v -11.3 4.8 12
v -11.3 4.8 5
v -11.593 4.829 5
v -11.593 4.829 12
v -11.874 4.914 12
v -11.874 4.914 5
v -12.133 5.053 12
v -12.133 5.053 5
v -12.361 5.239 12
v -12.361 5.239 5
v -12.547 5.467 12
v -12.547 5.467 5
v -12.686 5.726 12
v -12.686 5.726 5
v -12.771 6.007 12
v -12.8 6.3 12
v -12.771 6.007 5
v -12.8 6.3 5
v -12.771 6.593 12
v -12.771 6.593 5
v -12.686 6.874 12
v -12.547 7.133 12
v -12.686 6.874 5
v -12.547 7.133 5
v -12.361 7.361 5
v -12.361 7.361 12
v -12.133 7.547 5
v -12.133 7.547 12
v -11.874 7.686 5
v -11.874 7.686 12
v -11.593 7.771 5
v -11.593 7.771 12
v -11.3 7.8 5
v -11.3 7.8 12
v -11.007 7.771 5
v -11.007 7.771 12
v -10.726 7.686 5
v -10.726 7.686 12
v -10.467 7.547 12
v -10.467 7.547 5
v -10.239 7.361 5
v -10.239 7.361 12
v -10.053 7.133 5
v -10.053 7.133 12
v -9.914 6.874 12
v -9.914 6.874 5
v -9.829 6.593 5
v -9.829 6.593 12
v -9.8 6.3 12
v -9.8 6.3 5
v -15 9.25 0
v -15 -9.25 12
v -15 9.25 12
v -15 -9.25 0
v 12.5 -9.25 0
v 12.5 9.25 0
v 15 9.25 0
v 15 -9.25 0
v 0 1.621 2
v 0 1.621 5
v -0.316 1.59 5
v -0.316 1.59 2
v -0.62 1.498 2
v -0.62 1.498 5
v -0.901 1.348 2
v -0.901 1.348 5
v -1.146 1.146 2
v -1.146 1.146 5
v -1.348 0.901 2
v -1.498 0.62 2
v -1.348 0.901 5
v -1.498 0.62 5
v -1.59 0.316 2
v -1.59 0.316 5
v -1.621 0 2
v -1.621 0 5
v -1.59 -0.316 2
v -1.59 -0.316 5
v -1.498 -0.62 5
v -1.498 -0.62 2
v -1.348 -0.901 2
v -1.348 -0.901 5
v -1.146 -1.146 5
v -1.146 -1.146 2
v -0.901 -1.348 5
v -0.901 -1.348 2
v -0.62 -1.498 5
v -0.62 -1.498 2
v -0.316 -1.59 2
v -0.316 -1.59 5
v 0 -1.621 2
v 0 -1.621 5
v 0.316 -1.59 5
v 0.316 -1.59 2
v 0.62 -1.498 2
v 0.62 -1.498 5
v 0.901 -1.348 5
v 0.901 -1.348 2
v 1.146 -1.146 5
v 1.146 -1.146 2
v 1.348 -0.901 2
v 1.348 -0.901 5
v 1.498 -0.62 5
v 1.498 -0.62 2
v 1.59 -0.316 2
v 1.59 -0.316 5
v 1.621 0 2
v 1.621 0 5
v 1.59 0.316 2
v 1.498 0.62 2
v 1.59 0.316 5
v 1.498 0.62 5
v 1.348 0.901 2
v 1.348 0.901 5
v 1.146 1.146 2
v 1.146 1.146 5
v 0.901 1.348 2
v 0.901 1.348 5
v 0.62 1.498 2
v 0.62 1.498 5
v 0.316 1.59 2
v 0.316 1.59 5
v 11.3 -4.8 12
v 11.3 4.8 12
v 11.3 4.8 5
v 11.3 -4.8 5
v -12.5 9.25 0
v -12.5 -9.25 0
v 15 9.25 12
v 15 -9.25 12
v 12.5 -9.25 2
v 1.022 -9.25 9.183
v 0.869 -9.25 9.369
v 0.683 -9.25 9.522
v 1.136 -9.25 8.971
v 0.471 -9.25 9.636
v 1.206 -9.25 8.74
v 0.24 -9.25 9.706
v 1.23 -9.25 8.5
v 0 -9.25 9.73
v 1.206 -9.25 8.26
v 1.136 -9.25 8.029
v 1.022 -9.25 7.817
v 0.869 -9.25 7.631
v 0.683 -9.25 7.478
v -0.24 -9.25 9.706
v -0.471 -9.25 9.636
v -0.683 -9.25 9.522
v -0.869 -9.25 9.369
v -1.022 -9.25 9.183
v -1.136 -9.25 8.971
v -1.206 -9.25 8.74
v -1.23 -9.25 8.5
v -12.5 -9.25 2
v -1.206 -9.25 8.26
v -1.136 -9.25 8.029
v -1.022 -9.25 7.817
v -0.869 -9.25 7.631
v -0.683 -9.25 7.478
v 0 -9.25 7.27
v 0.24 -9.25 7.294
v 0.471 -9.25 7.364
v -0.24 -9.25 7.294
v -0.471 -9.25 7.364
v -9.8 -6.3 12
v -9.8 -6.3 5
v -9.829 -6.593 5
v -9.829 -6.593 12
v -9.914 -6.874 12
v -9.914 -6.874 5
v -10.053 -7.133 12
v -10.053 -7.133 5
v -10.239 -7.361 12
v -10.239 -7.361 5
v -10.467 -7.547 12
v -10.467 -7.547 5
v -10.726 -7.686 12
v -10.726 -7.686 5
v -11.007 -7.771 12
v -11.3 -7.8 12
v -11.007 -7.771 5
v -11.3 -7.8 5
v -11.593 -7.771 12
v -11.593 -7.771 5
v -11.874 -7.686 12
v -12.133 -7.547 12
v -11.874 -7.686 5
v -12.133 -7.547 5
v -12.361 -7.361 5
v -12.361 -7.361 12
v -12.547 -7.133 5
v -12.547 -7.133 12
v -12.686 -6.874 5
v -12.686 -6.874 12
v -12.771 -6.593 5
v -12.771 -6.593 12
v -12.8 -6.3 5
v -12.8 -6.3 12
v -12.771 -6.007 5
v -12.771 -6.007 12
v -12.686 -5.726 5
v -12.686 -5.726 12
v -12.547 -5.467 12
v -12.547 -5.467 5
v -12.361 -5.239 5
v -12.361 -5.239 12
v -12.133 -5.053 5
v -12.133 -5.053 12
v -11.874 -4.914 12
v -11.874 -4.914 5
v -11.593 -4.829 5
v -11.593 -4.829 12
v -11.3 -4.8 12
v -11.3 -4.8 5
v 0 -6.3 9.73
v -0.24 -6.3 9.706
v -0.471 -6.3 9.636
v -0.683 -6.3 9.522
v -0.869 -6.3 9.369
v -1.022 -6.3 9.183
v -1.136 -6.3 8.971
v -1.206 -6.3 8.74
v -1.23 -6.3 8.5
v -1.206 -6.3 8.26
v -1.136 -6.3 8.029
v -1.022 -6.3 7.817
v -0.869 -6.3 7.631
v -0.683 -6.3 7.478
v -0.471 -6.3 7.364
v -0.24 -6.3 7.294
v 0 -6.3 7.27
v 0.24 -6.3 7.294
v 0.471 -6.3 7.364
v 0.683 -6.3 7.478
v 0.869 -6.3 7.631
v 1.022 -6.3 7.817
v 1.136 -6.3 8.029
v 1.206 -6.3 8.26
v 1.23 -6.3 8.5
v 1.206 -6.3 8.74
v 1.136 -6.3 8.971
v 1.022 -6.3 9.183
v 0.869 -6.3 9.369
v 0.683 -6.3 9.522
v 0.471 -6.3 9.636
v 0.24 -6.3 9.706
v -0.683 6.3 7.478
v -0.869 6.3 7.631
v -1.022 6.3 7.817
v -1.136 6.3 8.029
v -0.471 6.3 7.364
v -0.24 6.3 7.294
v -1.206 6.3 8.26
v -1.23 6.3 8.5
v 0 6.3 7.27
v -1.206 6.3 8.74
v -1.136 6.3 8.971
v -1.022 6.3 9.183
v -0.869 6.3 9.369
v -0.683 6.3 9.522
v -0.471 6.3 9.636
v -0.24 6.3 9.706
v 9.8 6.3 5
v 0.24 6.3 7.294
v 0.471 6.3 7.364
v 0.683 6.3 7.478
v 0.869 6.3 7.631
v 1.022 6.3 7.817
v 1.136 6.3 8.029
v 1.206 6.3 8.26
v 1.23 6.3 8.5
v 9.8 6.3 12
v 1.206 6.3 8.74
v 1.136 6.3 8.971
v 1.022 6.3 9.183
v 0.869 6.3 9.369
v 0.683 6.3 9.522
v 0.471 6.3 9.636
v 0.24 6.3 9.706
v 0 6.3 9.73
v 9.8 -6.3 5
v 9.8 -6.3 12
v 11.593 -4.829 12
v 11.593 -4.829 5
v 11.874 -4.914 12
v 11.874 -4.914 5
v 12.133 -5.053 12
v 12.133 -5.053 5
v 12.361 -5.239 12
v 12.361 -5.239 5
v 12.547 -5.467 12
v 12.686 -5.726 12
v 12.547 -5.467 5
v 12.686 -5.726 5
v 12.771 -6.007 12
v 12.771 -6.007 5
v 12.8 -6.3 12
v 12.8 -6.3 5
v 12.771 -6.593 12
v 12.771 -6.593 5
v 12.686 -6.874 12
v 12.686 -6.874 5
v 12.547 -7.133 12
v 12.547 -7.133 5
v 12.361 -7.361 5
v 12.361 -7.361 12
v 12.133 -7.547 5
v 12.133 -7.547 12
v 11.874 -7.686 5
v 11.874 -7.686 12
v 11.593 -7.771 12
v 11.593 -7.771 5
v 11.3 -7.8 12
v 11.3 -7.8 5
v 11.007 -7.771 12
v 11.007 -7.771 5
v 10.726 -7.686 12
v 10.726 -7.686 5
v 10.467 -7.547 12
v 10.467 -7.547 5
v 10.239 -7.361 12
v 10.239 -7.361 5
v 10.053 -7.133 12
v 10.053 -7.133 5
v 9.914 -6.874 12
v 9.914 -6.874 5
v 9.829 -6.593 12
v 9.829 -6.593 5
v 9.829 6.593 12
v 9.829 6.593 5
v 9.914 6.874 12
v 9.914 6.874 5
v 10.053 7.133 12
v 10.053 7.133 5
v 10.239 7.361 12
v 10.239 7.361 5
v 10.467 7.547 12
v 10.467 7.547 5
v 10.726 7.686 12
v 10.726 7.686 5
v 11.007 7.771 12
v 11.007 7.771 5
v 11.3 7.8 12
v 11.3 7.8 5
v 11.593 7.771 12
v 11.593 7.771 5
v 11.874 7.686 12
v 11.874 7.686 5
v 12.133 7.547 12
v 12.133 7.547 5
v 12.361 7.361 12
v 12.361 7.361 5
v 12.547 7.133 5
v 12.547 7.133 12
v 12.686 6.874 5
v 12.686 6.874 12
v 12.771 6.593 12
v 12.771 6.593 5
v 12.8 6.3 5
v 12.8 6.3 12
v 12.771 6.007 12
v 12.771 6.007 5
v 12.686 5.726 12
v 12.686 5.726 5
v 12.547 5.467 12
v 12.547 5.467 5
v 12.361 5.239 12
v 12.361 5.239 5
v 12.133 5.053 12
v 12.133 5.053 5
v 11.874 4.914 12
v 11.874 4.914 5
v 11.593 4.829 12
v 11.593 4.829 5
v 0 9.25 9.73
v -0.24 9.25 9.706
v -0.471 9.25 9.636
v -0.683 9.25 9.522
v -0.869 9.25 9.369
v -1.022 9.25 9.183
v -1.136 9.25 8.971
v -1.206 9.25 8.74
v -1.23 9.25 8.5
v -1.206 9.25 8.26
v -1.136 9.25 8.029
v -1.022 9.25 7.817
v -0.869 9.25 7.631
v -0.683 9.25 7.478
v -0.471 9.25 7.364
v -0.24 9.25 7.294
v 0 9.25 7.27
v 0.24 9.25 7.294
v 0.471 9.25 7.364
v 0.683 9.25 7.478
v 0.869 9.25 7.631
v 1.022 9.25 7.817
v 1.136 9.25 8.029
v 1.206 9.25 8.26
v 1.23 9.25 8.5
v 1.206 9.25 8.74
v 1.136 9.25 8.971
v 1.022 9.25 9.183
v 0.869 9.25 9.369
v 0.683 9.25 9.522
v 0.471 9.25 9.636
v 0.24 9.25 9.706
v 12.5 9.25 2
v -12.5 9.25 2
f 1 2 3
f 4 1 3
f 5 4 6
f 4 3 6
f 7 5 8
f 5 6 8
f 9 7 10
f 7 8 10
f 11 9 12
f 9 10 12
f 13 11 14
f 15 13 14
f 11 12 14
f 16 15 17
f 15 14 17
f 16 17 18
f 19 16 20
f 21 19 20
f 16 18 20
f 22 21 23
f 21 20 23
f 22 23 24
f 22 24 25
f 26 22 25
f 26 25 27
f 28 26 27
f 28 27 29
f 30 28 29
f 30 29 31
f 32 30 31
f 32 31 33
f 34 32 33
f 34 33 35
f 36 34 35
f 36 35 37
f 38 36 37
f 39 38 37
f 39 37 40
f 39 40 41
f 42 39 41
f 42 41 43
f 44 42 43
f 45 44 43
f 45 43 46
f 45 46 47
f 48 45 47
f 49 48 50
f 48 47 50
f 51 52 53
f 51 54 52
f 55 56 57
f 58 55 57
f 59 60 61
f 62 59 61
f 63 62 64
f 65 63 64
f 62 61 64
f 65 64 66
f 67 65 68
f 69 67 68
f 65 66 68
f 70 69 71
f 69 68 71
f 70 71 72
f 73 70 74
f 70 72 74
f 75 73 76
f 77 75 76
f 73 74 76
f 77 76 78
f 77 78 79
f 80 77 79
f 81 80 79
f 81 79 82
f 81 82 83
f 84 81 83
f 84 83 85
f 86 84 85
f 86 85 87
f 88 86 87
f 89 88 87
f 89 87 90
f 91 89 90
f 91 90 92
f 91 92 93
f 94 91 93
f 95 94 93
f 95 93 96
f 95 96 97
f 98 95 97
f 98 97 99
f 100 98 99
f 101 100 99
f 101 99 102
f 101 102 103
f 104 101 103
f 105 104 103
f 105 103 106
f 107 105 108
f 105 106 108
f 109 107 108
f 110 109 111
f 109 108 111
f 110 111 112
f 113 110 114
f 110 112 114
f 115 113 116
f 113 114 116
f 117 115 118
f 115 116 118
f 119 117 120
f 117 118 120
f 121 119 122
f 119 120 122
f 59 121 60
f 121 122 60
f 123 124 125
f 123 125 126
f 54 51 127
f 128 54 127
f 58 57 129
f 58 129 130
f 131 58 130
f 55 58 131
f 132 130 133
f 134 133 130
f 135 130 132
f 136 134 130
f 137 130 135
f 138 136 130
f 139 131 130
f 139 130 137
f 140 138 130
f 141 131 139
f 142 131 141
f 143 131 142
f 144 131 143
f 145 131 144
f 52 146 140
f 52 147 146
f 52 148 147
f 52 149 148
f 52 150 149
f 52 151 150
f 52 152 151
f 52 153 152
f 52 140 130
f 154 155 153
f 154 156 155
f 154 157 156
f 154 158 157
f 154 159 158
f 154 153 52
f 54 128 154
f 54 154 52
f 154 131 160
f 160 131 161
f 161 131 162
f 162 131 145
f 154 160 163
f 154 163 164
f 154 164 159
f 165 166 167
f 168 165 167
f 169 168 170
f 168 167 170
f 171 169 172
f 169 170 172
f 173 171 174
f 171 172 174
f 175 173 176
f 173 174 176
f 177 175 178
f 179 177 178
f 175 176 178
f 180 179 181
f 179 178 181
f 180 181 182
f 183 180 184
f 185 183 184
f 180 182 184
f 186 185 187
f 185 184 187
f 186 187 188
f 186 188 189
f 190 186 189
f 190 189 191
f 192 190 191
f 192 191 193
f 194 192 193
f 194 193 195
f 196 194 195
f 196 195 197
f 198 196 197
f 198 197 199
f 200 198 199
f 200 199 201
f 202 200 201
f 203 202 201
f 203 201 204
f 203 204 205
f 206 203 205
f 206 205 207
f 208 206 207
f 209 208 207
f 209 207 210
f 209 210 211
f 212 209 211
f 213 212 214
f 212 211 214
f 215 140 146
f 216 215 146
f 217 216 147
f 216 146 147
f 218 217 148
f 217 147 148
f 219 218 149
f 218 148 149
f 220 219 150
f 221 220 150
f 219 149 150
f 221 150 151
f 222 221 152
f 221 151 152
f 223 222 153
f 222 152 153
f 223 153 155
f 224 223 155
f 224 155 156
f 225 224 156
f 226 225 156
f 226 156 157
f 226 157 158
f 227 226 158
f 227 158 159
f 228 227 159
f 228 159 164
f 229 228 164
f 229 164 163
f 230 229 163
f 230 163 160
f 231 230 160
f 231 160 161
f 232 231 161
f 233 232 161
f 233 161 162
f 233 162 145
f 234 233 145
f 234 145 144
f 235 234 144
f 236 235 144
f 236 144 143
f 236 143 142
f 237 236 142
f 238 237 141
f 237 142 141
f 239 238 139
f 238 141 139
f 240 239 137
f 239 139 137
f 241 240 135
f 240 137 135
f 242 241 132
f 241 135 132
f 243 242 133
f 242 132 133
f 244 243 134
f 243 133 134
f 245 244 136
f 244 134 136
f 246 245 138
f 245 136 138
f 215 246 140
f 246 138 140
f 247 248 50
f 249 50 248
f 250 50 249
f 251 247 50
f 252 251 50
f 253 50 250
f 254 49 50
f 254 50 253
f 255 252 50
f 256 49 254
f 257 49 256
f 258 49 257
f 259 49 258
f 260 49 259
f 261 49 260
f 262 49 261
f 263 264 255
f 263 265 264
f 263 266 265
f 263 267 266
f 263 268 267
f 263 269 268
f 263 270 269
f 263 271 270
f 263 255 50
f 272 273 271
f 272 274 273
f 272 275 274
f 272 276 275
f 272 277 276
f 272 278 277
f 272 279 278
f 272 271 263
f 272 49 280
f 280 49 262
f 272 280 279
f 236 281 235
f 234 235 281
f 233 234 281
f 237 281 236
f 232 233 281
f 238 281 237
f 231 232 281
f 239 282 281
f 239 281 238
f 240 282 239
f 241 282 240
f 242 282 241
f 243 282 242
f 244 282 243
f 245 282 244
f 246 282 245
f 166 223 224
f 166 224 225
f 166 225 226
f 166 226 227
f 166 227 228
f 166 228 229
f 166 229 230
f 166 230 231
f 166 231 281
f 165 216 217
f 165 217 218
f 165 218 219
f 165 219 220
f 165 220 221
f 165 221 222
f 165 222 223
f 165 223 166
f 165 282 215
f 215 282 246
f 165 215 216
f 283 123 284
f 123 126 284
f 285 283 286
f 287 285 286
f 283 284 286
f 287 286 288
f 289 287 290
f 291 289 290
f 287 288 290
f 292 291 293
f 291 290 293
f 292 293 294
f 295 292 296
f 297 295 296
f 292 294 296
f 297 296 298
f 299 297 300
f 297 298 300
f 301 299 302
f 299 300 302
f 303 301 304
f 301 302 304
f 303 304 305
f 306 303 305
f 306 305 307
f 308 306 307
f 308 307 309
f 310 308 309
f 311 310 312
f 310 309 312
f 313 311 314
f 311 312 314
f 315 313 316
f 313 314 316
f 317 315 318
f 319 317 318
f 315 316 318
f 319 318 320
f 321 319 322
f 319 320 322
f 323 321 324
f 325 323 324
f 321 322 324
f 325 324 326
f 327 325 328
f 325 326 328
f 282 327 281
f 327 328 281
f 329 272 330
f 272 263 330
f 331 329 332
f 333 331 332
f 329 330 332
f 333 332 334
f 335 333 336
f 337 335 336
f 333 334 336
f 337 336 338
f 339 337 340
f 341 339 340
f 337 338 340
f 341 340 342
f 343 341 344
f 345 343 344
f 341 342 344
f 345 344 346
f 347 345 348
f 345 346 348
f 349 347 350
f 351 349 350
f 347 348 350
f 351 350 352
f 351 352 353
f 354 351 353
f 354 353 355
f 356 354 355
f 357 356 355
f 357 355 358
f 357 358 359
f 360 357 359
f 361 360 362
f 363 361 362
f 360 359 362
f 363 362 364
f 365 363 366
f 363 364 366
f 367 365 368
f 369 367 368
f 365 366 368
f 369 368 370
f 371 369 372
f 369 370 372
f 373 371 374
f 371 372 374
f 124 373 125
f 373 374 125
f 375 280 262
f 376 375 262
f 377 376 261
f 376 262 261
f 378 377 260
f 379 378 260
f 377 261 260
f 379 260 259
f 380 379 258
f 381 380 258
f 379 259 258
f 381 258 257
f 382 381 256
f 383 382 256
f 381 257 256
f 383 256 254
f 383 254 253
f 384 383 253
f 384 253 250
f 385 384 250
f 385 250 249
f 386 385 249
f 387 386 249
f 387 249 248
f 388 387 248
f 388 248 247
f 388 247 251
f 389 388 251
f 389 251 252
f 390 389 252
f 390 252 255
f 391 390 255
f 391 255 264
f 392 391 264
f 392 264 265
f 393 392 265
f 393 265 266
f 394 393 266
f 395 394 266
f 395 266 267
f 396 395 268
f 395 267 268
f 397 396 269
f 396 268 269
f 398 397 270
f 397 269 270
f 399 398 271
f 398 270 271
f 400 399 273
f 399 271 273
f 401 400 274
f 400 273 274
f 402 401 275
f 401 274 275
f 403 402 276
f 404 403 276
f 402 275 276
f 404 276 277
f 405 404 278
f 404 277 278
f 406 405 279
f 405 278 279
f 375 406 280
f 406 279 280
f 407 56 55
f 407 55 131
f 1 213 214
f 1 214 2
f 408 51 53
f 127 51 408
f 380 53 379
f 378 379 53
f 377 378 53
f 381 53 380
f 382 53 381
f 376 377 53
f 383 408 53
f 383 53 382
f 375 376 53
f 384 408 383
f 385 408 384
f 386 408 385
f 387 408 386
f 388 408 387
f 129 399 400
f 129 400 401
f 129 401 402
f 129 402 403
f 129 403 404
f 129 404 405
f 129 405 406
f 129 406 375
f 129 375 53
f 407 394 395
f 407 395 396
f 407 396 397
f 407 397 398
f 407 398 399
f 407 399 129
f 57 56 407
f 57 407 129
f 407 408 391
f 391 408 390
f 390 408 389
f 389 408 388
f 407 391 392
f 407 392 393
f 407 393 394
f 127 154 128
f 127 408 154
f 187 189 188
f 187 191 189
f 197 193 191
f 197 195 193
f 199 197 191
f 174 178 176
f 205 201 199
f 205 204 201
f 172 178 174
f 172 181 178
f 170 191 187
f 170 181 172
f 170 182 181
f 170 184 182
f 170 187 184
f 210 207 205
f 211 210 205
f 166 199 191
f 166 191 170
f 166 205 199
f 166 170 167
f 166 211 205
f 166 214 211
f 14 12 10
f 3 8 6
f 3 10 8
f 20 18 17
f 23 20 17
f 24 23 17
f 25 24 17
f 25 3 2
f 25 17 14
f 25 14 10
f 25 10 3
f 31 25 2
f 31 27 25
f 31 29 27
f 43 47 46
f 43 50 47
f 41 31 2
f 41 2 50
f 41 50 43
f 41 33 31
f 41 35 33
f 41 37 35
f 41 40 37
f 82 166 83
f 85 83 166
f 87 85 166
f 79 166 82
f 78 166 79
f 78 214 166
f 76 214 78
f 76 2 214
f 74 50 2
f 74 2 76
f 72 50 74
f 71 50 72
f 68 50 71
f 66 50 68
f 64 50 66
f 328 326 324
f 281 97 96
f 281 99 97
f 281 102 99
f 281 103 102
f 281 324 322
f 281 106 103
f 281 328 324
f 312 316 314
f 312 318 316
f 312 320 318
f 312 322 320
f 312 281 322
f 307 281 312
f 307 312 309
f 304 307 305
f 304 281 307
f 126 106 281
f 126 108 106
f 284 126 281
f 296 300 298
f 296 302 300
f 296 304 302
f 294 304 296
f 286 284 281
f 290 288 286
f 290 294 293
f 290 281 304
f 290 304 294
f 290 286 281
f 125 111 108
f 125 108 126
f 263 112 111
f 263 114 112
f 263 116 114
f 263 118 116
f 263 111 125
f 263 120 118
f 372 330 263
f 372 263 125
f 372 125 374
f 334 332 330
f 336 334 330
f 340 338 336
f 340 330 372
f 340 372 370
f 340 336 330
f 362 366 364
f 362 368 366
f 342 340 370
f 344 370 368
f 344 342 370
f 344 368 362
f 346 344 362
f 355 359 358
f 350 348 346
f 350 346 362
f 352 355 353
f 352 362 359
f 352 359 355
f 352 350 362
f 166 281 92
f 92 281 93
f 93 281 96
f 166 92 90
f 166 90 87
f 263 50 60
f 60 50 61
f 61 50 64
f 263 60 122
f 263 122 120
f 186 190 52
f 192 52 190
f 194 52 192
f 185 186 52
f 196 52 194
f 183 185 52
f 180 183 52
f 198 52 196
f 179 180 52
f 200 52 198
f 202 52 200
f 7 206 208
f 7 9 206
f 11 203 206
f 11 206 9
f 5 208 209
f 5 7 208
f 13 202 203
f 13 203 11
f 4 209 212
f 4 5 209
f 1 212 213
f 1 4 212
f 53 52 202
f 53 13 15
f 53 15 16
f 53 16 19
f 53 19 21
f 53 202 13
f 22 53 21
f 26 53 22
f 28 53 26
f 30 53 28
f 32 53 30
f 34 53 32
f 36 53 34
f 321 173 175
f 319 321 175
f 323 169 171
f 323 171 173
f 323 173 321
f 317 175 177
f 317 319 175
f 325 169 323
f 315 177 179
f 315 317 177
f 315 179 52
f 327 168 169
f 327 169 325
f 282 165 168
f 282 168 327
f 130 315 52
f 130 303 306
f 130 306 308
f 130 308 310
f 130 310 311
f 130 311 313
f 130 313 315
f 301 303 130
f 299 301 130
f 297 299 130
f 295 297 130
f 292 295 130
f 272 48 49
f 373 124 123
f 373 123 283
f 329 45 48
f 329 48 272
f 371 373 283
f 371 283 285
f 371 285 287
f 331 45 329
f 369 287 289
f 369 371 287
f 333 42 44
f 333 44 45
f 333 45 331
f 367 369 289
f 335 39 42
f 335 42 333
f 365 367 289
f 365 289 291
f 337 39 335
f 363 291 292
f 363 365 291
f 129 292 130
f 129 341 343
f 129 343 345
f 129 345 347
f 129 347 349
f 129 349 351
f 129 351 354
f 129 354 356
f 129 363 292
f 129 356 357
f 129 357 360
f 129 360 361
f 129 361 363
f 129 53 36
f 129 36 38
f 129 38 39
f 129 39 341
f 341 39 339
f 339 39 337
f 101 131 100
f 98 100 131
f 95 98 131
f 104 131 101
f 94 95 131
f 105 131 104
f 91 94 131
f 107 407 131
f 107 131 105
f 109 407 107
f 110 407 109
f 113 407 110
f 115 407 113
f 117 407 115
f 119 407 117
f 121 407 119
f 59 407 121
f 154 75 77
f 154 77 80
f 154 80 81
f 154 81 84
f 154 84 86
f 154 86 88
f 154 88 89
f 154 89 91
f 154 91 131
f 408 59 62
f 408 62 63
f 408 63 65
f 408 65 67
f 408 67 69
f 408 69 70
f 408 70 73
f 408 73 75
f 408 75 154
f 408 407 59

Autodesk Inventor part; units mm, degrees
ref_plane "YZ Plane" through (0, 0, 0) normal (1, 0, 0) x (0, 1, 0)
ref_plane "XZ Plane" through (0, 0, 0) normal (0, 1, 0) x (-1, 0, 0)
ref_plane "XY Plane" through (0, 0, 0) normal (0, 0, 1) x (1, 0, 0)
sketch "Sketch1" plane through (0, 0, 0) normal (0, 0, 1) x (1, 0, 0)
  line L0 (0, 12.95) -> (0, -12.95) construction
  line L1 (-21, 0) -> (21, 0) construction
  line L2 (-15, 9.25) -> (15, 9.25)
  line L3 (15, 9.25) -> (15, -9.25)
  line L4 (15, -9.25) -> (-15, -9.25)
  line L5 (-15, -9.25) -> (-15, 9.25)
  point P0 (0, 0)
  dimension "d0" = 18.5
  dimension "d1" = 30
extrude "Extrusion1" add sketch "Sketch1" along normal blind 12
sketch "Sketch2" plane through (0, 0, 0) normal (0, 0, -1) x (-1, 0, 0)
  line L0 (-15, 9.25) -> (15, -9.25) construction
  line L1 (15, 9.25) -> (-15, -9.25) construction
  point P0 (0, 0)
  point P1 (0, 0)
hole "Hole1" at (0, 0, 0) direction (0, 0, 1) diameter 3.242 end through all thread size "M4x0.7" class "6H" standard "ISO Metric profile"
sketch "Sketch3" plane through (0, 0, 12) normal (0, 0, 1) x (1, 0, 0)
  line L0 (15, 9.25) -> (15, -9.25) projected
  line L1 (-15, 9.25) -> (15, 9.25) projected
  line L2 (-15, -9.25) -> (-15, 9.25) projected
  line L3 (15, -9.25) -> (-15, -9.25) projected
  line L4 (-15, 0) -> (15, 0) construction
  line L5 (0, 9.25) -> (0, -9.25) construction
  line L6 (-11.3, 6.3) -> (11.3, 6.3) construction
  line L7 (11.3, 6.3) -> (11.3, -6.3) construction
  line L8 (11.3, -6.3) -> (-11.3, -6.3) construction
  line L9 (-11.3, -6.3) -> (-11.3, 6.3) construction
  dimension "d11" = 12.6
  dimension "d12" = 22.6
hole "Hole2" at (-11.3, 6.3, 12) at (11.3, 6.3, 12) at (11.3, -6.3, 12) at (-11.3, -6.3, 12) direction (0, 0, -1) diameter 3 depth 7
sketch "Sketch4" plane through (0, 0, 12) normal (0, 0, 1) x (1, 0, 0)
  circle A0 centre (11.3, -6.3) radius 1.5 projected
  circle A1 centre (-11.3, 6.3) radius 1.5 projected
  circle A2 centre (0, 0) radius 1.621 projected
  line L0 (-11.3, 6.3) -> (11.3, 6.3)
  line L1 (11.3, 6.3) -> (11.3, -6.3)
  line L2 (11.3, -6.3) -> (-11.3, -6.3)
  line L3 (-11.3, -6.3) -> (-11.3, 6.3)
extrude "Extrusion2" cut sketch "Sketch4" against normal blind 7 contours L1 L2 A0 | A0 L2 L3 A1 L0 L1 | A1 L3 L0 picked at (10.3125, -6.1887) picked at (-10.4586, 5.7713)
sketch "Sketch5" plane through (-15, 9.25, 0) normal (0, 1, 0) x (1, 0, 0)
  line L0 (5.2, -12) -> (5.2, -5) construction
  line L1 (24.8, -12) -> (5.2, -12) construction
  line L2 (24.8, -5) -> (24.8, -12) construction
  line L3 (5.2, -5) -> (24.8, -5) construction
  line L4 (24.8, -8.5) -> (5.2, -8.5) construction
  point P0 (15, 0)
  point P1 (15, -8.5)
  dimension "d33" = 9.8
hole "Hole3" at (0, 9.25, 8.5) direction (0, -1, 0) diameter 2.459 end through all thread size "M3x0.5" class "6H" standard "ANSI Metric M Profile"
sketch "Sketch6" plane through (-15, 9.25, 0) normal (0, 1, 0) x (1, 0, 0)
  line L0 (0, 0) -> (30, 0) projected
  line L1 (15, 2.4) -> (15, -14.4) construction
  line L2 (2.5, 0) -> (27.5, 0)
  line L3 (27.5, 0) -> (27.5, -2)
  line L4 (27.5, -2) -> (2.5, -2)
  line L5 (2.5, -2) -> (2.5, 0)
  point P0 (15, 0)
  dimension "d29" = 25
  dimension "d30" = 2
extrude "Extrusion3" cut sketch "Sketch6" against normal up to next
properties part number "Küvettenklammer_20mm_version3"
